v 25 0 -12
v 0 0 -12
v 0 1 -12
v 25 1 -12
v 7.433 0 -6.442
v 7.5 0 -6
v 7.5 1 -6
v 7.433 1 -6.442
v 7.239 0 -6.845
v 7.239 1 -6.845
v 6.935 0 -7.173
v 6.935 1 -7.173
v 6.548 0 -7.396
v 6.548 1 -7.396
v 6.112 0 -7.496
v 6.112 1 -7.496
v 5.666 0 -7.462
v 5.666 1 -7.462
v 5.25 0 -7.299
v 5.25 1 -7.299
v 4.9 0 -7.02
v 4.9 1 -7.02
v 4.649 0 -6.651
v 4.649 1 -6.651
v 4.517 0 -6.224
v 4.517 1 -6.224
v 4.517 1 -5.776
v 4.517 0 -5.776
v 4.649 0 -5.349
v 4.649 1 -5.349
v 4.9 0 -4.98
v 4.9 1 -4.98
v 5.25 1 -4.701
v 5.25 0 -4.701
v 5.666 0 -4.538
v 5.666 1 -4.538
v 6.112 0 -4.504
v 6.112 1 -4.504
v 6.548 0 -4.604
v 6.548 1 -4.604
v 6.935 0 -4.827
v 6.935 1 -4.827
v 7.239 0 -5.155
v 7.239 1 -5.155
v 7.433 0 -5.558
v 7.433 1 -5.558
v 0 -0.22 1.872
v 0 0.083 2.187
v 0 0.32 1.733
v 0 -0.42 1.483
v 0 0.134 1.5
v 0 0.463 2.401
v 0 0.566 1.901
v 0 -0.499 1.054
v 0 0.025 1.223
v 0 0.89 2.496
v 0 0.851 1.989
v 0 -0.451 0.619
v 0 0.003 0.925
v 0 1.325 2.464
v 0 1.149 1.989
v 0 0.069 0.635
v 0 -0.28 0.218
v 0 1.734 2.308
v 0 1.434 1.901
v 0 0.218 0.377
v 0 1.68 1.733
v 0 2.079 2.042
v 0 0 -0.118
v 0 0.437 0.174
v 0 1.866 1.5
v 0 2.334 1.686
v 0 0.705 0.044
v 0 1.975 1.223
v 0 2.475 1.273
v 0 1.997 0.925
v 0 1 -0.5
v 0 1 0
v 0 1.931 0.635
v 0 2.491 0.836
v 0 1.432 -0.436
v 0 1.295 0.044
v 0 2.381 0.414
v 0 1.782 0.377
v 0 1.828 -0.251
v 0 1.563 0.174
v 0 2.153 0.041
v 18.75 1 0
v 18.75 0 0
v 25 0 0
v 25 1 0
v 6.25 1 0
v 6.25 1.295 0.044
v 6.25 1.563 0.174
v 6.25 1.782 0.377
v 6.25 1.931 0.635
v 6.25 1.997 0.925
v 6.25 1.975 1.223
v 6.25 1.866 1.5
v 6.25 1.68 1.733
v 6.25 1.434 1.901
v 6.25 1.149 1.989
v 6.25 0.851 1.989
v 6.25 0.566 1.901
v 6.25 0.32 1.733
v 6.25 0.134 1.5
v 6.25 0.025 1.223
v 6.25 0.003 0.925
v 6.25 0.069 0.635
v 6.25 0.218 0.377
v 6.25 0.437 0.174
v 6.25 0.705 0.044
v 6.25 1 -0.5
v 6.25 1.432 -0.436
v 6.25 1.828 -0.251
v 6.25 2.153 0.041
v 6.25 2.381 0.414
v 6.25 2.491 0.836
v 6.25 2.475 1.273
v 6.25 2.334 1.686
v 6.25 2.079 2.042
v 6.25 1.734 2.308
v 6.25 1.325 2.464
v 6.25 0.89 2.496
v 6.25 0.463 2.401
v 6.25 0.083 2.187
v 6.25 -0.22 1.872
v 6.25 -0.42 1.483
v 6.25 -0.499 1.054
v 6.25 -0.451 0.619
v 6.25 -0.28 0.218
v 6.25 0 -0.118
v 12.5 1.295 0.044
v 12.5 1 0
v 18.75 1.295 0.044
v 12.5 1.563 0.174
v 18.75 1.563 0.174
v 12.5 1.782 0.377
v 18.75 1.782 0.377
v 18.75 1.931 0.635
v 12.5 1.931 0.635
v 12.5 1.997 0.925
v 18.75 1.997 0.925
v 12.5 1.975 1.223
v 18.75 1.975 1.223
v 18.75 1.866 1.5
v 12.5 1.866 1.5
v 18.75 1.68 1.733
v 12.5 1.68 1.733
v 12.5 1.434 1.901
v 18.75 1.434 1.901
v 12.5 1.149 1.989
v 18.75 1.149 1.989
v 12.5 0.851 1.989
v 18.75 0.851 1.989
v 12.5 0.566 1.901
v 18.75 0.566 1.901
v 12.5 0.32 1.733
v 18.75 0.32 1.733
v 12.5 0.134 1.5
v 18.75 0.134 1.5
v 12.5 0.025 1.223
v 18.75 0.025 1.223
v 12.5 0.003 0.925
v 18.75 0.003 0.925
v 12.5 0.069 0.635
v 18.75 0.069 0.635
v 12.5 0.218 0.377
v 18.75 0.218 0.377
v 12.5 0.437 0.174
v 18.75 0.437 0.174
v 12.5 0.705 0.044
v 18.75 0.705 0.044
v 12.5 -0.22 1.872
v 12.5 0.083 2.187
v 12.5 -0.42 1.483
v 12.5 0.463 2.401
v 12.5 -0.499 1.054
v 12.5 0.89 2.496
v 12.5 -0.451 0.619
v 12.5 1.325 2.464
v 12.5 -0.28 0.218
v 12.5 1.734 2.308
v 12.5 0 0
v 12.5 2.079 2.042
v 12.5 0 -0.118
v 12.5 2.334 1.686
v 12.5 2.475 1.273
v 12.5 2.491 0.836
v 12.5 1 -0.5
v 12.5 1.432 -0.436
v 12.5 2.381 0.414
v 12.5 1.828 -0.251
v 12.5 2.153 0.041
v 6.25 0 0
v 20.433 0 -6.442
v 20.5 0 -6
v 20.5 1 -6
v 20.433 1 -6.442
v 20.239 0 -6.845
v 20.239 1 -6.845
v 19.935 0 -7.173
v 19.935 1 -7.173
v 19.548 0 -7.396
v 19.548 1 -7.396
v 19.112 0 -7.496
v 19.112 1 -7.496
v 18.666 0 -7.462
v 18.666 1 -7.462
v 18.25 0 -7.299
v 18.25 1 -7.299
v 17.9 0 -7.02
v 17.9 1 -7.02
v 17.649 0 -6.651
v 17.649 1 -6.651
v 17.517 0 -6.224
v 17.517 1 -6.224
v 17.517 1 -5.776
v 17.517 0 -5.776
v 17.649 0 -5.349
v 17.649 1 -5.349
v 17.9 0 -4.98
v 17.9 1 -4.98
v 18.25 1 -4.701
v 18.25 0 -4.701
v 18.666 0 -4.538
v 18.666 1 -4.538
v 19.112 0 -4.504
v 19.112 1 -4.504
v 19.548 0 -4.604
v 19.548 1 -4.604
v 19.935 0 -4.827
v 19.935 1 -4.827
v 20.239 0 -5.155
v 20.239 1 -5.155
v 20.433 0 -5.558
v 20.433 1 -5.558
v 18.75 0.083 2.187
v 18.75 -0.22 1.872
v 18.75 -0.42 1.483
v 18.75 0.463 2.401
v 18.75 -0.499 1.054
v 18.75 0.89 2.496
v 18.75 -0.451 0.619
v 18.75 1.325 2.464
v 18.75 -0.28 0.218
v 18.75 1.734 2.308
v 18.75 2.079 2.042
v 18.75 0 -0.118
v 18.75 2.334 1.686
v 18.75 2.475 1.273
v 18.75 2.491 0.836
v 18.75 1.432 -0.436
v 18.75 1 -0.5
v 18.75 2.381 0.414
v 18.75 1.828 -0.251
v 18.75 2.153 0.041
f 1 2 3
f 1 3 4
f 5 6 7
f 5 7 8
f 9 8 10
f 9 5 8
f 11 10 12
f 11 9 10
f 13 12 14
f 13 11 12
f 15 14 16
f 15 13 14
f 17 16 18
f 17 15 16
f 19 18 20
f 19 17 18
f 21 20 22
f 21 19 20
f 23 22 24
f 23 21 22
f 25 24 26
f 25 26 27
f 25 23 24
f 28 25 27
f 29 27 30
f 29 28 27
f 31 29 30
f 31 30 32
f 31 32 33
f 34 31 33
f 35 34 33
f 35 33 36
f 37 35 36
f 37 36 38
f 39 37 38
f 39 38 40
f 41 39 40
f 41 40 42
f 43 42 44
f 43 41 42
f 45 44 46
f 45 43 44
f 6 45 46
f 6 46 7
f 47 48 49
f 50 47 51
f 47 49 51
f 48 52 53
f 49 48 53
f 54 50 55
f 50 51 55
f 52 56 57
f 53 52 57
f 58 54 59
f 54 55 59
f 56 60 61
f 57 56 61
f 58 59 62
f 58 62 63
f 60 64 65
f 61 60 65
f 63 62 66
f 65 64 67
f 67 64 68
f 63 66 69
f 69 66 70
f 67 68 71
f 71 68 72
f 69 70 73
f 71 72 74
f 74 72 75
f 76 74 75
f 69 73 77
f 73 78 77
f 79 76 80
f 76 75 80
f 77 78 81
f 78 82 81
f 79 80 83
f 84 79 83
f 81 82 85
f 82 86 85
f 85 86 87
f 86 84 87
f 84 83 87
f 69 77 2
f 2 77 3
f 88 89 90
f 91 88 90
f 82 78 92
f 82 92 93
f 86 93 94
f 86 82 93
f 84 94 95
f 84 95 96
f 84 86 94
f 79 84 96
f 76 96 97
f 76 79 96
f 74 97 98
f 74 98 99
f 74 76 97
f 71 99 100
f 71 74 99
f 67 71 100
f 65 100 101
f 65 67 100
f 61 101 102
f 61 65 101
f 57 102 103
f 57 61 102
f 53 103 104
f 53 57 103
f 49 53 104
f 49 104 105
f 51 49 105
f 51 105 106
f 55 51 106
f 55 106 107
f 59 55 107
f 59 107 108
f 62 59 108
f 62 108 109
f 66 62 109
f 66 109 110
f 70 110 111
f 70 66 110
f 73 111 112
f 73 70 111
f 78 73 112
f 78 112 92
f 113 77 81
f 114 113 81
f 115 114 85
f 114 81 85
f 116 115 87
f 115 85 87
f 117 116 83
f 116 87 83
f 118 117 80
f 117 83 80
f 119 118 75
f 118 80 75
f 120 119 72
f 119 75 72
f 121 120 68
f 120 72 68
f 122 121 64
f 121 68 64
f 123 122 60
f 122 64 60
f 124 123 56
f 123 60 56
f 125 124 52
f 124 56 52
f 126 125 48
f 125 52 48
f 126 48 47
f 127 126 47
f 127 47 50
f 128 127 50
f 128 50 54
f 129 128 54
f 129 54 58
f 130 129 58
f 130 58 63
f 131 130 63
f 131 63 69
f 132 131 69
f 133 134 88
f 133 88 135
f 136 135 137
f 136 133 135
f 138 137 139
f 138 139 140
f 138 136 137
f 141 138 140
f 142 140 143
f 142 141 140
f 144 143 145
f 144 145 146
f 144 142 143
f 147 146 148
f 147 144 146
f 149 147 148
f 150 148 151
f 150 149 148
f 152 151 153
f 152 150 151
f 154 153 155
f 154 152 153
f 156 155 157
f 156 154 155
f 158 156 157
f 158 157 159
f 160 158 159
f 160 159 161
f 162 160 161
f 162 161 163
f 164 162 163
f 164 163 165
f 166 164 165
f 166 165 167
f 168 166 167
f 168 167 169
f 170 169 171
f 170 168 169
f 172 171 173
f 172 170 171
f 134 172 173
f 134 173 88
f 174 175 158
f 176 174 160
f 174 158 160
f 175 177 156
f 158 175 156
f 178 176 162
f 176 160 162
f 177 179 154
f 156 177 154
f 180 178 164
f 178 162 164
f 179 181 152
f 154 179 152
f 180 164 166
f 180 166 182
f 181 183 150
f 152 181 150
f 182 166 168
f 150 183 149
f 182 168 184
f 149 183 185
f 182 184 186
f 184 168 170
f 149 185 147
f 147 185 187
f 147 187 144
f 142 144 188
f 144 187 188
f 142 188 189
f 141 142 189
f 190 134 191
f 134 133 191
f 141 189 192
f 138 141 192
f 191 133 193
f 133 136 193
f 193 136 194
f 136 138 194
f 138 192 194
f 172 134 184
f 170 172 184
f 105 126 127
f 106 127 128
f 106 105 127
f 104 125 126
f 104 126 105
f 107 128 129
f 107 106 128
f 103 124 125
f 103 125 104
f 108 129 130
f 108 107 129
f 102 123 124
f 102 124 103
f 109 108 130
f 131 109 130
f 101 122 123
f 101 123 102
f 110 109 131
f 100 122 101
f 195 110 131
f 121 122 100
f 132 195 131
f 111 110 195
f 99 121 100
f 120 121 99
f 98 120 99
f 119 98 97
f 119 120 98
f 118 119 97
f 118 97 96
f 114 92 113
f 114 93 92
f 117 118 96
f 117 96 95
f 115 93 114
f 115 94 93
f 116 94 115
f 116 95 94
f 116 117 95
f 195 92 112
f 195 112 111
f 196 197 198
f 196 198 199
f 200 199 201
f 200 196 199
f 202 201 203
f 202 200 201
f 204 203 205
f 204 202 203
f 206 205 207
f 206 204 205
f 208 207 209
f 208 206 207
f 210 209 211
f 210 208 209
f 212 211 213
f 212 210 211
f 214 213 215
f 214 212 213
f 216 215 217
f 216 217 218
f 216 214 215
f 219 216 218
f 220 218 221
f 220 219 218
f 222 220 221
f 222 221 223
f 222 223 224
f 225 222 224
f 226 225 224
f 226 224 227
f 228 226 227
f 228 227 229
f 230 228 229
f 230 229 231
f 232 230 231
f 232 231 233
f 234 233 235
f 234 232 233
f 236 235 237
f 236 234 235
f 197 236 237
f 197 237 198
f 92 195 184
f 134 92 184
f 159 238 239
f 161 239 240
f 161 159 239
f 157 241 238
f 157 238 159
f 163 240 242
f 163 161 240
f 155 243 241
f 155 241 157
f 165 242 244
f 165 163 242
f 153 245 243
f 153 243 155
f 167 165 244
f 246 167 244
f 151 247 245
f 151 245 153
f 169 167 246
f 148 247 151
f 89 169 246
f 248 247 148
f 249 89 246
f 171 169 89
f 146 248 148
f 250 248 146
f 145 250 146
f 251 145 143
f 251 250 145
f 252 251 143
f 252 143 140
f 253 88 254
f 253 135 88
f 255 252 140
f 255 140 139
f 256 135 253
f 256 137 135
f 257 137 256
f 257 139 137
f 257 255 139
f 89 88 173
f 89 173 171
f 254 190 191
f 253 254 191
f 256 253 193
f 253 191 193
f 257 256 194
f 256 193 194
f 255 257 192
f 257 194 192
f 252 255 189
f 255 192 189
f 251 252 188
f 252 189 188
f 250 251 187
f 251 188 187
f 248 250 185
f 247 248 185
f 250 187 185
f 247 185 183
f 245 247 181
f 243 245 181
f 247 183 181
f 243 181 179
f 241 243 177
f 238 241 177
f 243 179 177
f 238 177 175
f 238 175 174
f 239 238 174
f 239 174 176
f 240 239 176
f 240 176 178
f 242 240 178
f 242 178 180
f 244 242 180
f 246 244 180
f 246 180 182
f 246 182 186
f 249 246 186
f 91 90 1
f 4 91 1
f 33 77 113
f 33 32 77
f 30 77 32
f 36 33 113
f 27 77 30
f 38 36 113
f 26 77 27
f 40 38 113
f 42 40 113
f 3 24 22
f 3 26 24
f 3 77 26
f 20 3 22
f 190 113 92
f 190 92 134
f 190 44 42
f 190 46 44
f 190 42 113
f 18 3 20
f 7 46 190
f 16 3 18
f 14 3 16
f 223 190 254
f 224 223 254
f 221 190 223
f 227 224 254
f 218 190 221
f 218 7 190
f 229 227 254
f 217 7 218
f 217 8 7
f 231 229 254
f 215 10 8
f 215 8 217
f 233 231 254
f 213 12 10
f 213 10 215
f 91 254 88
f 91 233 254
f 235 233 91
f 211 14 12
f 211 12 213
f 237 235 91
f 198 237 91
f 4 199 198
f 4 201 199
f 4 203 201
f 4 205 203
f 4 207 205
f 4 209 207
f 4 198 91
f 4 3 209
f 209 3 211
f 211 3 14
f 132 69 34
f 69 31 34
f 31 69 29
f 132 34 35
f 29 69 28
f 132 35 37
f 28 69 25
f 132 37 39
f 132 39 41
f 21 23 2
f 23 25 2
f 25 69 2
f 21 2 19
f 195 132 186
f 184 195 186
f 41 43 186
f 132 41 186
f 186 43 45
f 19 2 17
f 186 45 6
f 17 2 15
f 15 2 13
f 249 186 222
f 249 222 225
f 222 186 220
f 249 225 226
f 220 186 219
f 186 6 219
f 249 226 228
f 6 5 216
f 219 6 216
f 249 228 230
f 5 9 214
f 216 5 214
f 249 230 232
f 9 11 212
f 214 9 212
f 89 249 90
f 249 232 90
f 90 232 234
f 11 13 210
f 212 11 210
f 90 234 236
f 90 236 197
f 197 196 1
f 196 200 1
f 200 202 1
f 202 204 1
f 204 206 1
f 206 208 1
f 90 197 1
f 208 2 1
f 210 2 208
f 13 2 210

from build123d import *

# Parameters (mm, degrees)
SKETCH1_W           = 25
SKETCH1_H           = 12
SKETCH1_R           = 1.5
BOSS_EXTRUDE1_DEPTH = 1
SKETCH2_R           = 1.5
SKETCH2_R_2         = 1
BOSS_EXTRUDE2_DEPTH = 6.25
BOSS_EXTRUDE3_START = 12.5
SKETCH3_R           = 1.5
SKETCH3_R_2         = 1
BOSS_EXTRUDE3_DEPTH = 6.25


with BuildPart() as part:
    # Sketch1 → Boss-Extrude1 (new body)
    with BuildSketch(Plane(origin=(0, 0, 0), x_dir=(1, 0, 0), z_dir=(0, 1, 0))):
        with Locations((12.5, 6)):
            Rectangle(SKETCH1_W, SKETCH1_H)
        with Locations((6, 6)):
            Circle(SKETCH1_R, mode=Mode.SUBTRACT)
        with Locations((19, 6)):
            Circle(SKETCH1_R, mode=Mode.SUBTRACT)
    extrude(amount=BOSS_EXTRUDE1_DEPTH)

    # Sketch2 → Boss-Extrude2 (add)
    with BuildSketch(Plane(origin=(0, 0, 0), x_dir=(0, 0, -1), z_dir=(1, 0, 0))):
        with Locations((-1, 1)):
            Circle(SKETCH2_R)
        with Locations((-1, 1)):
            Circle(SKETCH2_R_2, mode=Mode.SUBTRACT)
    extrude(amount=BOSS_EXTRUDE2_DEPTH)

    # Sketch3 → Boss-Extrude3 (add)
    with BuildSketch(Plane(origin=(0, 0, 0), x_dir=(0, 0, -1), z_dir=(1, 0, 0)).offset(BOSS_EXTRUDE3_START)):
        with Locations((-1, 1)):
            Circle(SKETCH3_R)
        with Locations((-1, 1)):
            Circle(SKETCH3_R_2, mode=Mode.SUBTRACT)
    extrude(amount=BOSS_EXTRUDE3_DEPTH)


solid = part.part
